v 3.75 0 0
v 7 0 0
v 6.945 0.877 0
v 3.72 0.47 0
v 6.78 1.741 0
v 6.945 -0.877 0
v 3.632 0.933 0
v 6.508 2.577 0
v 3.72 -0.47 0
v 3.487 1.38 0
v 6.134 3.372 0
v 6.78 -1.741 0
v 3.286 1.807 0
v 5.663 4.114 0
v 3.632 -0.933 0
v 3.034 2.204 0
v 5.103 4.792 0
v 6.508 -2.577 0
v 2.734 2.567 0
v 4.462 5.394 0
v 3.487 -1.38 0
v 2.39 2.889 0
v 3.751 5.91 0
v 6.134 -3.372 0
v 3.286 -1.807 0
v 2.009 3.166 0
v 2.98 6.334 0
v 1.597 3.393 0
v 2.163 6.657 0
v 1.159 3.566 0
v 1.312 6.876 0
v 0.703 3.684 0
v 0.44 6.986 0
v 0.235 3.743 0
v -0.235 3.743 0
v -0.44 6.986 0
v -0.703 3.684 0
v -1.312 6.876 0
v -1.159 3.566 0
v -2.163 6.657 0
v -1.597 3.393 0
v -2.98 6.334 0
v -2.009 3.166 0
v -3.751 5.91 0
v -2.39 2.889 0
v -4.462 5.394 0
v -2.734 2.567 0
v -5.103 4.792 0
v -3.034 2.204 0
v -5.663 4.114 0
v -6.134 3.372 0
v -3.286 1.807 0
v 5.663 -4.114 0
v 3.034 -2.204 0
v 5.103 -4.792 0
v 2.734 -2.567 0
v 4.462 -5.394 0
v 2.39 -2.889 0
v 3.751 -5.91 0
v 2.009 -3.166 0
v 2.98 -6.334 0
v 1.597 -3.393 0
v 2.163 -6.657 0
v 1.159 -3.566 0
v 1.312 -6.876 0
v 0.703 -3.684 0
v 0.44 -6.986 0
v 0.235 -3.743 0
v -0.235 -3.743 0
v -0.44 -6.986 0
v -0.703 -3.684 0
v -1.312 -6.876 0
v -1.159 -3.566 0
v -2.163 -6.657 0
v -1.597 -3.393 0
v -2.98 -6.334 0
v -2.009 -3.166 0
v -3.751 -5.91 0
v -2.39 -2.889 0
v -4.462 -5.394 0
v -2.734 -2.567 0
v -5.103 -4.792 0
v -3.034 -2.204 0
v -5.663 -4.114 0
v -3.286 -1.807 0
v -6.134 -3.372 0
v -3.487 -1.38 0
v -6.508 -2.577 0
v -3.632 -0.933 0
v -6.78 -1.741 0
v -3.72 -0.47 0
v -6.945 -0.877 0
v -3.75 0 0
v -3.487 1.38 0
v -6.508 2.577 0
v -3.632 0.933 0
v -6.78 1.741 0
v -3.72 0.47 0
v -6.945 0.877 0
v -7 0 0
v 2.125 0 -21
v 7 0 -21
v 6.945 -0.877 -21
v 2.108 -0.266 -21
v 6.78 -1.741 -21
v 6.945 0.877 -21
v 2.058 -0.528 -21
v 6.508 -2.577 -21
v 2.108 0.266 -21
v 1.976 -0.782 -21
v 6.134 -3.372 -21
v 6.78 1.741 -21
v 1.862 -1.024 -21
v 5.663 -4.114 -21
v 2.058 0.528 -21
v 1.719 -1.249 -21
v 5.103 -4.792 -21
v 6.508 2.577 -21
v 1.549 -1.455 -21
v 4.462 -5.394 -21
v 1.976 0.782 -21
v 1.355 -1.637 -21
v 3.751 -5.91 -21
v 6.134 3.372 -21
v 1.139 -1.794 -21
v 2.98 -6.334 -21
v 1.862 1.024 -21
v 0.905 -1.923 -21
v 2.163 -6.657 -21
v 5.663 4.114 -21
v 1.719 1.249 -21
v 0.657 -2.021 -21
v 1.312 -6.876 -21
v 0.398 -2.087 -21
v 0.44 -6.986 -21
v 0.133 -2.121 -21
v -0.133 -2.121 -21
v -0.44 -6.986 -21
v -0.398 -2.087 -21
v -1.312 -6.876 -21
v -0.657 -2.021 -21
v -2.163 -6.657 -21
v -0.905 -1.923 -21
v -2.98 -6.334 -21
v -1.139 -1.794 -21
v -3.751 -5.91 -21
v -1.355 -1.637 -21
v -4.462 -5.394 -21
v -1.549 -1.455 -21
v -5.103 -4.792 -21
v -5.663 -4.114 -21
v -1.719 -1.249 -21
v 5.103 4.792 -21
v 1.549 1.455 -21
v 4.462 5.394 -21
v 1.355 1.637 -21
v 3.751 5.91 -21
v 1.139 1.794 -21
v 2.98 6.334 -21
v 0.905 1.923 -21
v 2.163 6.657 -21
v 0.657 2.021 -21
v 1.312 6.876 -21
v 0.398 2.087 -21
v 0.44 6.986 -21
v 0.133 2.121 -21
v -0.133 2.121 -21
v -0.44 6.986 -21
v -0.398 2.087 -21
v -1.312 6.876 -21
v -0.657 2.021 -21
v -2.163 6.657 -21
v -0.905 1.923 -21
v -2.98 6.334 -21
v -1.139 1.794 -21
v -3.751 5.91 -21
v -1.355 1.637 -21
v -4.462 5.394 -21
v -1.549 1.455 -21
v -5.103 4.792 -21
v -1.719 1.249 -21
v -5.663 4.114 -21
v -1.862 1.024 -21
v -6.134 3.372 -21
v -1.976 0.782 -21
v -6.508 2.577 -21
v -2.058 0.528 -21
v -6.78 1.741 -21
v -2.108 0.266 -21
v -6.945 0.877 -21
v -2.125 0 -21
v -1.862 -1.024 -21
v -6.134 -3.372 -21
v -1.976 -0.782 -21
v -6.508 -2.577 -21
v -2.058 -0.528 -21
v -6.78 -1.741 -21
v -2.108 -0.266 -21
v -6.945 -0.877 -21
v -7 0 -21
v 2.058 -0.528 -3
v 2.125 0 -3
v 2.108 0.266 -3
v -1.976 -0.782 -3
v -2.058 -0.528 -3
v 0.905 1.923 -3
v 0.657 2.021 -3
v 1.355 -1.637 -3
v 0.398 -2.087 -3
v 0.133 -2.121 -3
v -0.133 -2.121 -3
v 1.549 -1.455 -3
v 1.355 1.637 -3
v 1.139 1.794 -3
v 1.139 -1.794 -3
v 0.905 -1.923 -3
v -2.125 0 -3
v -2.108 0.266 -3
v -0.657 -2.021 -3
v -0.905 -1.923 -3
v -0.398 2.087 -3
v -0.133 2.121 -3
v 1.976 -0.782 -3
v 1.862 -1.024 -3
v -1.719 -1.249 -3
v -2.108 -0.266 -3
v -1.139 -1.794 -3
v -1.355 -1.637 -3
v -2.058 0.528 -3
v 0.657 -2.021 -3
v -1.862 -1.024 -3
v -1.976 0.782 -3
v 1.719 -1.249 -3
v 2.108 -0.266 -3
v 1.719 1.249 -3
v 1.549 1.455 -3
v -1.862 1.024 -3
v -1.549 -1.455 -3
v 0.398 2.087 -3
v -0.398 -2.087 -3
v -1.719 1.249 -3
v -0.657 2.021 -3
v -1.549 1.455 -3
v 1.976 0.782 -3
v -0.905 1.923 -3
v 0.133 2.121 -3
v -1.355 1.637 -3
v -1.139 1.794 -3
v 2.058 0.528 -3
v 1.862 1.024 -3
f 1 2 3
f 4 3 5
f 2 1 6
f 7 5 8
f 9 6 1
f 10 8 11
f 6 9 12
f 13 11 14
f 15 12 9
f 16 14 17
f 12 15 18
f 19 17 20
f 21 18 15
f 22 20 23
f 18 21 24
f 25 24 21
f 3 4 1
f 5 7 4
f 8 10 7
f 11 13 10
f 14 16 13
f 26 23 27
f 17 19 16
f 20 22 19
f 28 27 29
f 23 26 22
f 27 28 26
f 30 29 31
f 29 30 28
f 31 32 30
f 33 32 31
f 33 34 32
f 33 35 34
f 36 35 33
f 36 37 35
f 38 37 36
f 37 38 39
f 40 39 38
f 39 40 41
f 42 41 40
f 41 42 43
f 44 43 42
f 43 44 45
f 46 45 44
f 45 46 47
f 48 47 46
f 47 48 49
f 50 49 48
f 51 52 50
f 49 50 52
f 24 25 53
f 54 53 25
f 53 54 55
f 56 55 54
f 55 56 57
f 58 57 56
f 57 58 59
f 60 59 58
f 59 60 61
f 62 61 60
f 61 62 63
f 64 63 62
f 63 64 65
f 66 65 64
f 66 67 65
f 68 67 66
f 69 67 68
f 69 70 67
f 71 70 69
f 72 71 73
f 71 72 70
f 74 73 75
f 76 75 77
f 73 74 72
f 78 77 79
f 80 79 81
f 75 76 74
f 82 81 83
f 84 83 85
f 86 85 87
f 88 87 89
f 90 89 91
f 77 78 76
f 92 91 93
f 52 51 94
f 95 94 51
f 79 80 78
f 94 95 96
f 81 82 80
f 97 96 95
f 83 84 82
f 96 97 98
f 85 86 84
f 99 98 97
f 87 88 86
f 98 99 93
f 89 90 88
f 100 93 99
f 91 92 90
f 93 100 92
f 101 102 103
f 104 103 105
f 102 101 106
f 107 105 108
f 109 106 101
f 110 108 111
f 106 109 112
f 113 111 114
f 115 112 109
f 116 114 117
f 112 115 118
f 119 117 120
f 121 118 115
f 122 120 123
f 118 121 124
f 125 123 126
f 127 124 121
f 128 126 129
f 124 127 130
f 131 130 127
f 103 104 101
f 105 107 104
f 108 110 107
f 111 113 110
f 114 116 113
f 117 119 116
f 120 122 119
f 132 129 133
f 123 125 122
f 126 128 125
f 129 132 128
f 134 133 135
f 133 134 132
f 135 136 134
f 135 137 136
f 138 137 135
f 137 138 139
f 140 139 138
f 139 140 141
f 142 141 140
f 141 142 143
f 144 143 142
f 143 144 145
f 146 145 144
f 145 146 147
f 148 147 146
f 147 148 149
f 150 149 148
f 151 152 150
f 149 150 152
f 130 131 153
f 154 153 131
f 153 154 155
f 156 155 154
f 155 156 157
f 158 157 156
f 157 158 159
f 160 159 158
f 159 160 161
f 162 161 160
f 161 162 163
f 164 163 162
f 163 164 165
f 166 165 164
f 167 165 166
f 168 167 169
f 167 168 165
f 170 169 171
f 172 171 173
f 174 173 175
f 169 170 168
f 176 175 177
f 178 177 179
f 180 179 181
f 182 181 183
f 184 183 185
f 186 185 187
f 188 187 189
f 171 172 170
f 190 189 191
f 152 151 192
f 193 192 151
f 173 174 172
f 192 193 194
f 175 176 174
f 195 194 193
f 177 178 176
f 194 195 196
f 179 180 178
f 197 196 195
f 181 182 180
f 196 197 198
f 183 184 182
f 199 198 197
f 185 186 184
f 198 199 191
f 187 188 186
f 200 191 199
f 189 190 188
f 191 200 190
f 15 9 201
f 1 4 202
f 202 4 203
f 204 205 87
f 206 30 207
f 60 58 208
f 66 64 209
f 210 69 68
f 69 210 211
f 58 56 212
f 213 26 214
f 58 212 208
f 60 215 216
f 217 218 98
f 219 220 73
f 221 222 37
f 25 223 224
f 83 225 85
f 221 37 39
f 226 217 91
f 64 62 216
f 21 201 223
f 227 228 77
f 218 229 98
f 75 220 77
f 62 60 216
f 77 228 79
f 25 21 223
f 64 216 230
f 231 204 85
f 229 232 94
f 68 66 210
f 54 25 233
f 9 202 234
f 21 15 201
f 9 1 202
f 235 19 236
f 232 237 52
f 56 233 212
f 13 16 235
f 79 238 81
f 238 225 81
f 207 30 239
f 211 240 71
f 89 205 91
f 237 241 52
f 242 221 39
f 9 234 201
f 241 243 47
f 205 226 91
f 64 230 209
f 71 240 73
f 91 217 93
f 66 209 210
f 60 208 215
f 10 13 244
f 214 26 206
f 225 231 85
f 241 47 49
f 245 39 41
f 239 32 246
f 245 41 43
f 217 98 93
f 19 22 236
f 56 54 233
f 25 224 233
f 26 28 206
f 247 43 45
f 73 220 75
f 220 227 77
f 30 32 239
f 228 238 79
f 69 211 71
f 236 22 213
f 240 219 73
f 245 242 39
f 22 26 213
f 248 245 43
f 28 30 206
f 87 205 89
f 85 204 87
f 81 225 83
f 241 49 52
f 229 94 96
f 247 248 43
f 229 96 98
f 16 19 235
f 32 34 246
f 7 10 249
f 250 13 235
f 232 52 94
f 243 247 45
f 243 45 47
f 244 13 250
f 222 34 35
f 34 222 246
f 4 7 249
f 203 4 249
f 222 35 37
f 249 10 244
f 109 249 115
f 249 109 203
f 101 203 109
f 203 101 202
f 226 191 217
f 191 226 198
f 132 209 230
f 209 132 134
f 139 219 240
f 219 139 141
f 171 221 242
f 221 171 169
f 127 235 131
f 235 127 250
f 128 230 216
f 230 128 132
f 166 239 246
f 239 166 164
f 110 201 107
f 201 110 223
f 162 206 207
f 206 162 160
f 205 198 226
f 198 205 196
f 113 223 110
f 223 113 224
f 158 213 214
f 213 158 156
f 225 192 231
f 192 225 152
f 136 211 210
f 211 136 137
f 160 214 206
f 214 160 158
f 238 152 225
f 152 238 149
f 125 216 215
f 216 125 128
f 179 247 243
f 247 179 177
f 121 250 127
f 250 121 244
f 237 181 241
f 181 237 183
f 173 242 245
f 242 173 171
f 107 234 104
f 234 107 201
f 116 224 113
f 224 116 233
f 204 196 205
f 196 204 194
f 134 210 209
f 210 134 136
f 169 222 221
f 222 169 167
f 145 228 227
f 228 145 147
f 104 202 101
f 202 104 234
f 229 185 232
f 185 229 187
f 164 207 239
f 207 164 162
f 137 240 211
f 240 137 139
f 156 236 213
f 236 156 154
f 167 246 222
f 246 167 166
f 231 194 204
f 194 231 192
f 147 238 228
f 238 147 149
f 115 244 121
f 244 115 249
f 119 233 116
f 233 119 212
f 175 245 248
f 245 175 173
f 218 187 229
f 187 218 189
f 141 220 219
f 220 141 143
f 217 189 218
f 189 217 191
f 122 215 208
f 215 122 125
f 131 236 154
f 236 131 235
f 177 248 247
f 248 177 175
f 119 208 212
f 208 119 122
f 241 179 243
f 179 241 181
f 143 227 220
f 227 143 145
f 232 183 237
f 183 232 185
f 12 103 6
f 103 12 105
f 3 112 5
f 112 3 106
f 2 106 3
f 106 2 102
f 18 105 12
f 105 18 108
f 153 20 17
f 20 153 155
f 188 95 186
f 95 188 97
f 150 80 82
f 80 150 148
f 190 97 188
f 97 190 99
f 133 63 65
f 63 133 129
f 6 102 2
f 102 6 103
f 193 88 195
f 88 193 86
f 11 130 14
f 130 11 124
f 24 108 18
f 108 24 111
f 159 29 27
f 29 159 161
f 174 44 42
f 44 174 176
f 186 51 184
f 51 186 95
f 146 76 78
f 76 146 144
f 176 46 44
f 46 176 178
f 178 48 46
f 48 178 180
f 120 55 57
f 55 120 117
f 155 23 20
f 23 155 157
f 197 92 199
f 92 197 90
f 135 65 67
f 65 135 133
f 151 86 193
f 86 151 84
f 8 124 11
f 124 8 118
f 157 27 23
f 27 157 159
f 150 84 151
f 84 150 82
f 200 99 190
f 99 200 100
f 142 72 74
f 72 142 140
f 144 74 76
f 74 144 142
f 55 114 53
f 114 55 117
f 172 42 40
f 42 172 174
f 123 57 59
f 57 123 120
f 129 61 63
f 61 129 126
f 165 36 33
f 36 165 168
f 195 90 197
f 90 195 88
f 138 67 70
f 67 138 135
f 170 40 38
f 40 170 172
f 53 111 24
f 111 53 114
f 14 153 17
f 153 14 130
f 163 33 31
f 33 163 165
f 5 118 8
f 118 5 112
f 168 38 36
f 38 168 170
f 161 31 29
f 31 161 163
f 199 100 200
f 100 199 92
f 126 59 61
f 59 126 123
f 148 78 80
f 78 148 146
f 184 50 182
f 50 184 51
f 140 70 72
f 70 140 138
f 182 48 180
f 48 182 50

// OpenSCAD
$fn = 50;


difference() {
	union() {
		translate(v = [0, 0, -21.0000000000]) {
			cylinder(h = 21, r = 7.0000000000);
		}
		cylinder(h = 0, r = 16.0000000000);
	}
	union() {
		translate(v = [0, 0, 0]) {
			rotate(a = [0, 0, 0]) {
				difference() {
					union() {
						#translate(v = [0, 0, -21.0000000000]) {
							cylinder(h = 21, r = 2.0000000000);
						}
						#translate(v = [0, 0, -3]) {
							cylinder(h = 3, r = 7.0000000000, r1 = 2.1250000000, r2 = 3.7500000000);
						}
						#translate(v = [0, 0, -21.0000000000]) {
							cylinder(h = 21, r = 2.1250000000);
						}
						#translate(v = [0, 0, -21.0000000000]) {
							cylinder(h = 21, r = 2.0000000000);
						}
					}
					union();
				}
			}
		}
	}
}
